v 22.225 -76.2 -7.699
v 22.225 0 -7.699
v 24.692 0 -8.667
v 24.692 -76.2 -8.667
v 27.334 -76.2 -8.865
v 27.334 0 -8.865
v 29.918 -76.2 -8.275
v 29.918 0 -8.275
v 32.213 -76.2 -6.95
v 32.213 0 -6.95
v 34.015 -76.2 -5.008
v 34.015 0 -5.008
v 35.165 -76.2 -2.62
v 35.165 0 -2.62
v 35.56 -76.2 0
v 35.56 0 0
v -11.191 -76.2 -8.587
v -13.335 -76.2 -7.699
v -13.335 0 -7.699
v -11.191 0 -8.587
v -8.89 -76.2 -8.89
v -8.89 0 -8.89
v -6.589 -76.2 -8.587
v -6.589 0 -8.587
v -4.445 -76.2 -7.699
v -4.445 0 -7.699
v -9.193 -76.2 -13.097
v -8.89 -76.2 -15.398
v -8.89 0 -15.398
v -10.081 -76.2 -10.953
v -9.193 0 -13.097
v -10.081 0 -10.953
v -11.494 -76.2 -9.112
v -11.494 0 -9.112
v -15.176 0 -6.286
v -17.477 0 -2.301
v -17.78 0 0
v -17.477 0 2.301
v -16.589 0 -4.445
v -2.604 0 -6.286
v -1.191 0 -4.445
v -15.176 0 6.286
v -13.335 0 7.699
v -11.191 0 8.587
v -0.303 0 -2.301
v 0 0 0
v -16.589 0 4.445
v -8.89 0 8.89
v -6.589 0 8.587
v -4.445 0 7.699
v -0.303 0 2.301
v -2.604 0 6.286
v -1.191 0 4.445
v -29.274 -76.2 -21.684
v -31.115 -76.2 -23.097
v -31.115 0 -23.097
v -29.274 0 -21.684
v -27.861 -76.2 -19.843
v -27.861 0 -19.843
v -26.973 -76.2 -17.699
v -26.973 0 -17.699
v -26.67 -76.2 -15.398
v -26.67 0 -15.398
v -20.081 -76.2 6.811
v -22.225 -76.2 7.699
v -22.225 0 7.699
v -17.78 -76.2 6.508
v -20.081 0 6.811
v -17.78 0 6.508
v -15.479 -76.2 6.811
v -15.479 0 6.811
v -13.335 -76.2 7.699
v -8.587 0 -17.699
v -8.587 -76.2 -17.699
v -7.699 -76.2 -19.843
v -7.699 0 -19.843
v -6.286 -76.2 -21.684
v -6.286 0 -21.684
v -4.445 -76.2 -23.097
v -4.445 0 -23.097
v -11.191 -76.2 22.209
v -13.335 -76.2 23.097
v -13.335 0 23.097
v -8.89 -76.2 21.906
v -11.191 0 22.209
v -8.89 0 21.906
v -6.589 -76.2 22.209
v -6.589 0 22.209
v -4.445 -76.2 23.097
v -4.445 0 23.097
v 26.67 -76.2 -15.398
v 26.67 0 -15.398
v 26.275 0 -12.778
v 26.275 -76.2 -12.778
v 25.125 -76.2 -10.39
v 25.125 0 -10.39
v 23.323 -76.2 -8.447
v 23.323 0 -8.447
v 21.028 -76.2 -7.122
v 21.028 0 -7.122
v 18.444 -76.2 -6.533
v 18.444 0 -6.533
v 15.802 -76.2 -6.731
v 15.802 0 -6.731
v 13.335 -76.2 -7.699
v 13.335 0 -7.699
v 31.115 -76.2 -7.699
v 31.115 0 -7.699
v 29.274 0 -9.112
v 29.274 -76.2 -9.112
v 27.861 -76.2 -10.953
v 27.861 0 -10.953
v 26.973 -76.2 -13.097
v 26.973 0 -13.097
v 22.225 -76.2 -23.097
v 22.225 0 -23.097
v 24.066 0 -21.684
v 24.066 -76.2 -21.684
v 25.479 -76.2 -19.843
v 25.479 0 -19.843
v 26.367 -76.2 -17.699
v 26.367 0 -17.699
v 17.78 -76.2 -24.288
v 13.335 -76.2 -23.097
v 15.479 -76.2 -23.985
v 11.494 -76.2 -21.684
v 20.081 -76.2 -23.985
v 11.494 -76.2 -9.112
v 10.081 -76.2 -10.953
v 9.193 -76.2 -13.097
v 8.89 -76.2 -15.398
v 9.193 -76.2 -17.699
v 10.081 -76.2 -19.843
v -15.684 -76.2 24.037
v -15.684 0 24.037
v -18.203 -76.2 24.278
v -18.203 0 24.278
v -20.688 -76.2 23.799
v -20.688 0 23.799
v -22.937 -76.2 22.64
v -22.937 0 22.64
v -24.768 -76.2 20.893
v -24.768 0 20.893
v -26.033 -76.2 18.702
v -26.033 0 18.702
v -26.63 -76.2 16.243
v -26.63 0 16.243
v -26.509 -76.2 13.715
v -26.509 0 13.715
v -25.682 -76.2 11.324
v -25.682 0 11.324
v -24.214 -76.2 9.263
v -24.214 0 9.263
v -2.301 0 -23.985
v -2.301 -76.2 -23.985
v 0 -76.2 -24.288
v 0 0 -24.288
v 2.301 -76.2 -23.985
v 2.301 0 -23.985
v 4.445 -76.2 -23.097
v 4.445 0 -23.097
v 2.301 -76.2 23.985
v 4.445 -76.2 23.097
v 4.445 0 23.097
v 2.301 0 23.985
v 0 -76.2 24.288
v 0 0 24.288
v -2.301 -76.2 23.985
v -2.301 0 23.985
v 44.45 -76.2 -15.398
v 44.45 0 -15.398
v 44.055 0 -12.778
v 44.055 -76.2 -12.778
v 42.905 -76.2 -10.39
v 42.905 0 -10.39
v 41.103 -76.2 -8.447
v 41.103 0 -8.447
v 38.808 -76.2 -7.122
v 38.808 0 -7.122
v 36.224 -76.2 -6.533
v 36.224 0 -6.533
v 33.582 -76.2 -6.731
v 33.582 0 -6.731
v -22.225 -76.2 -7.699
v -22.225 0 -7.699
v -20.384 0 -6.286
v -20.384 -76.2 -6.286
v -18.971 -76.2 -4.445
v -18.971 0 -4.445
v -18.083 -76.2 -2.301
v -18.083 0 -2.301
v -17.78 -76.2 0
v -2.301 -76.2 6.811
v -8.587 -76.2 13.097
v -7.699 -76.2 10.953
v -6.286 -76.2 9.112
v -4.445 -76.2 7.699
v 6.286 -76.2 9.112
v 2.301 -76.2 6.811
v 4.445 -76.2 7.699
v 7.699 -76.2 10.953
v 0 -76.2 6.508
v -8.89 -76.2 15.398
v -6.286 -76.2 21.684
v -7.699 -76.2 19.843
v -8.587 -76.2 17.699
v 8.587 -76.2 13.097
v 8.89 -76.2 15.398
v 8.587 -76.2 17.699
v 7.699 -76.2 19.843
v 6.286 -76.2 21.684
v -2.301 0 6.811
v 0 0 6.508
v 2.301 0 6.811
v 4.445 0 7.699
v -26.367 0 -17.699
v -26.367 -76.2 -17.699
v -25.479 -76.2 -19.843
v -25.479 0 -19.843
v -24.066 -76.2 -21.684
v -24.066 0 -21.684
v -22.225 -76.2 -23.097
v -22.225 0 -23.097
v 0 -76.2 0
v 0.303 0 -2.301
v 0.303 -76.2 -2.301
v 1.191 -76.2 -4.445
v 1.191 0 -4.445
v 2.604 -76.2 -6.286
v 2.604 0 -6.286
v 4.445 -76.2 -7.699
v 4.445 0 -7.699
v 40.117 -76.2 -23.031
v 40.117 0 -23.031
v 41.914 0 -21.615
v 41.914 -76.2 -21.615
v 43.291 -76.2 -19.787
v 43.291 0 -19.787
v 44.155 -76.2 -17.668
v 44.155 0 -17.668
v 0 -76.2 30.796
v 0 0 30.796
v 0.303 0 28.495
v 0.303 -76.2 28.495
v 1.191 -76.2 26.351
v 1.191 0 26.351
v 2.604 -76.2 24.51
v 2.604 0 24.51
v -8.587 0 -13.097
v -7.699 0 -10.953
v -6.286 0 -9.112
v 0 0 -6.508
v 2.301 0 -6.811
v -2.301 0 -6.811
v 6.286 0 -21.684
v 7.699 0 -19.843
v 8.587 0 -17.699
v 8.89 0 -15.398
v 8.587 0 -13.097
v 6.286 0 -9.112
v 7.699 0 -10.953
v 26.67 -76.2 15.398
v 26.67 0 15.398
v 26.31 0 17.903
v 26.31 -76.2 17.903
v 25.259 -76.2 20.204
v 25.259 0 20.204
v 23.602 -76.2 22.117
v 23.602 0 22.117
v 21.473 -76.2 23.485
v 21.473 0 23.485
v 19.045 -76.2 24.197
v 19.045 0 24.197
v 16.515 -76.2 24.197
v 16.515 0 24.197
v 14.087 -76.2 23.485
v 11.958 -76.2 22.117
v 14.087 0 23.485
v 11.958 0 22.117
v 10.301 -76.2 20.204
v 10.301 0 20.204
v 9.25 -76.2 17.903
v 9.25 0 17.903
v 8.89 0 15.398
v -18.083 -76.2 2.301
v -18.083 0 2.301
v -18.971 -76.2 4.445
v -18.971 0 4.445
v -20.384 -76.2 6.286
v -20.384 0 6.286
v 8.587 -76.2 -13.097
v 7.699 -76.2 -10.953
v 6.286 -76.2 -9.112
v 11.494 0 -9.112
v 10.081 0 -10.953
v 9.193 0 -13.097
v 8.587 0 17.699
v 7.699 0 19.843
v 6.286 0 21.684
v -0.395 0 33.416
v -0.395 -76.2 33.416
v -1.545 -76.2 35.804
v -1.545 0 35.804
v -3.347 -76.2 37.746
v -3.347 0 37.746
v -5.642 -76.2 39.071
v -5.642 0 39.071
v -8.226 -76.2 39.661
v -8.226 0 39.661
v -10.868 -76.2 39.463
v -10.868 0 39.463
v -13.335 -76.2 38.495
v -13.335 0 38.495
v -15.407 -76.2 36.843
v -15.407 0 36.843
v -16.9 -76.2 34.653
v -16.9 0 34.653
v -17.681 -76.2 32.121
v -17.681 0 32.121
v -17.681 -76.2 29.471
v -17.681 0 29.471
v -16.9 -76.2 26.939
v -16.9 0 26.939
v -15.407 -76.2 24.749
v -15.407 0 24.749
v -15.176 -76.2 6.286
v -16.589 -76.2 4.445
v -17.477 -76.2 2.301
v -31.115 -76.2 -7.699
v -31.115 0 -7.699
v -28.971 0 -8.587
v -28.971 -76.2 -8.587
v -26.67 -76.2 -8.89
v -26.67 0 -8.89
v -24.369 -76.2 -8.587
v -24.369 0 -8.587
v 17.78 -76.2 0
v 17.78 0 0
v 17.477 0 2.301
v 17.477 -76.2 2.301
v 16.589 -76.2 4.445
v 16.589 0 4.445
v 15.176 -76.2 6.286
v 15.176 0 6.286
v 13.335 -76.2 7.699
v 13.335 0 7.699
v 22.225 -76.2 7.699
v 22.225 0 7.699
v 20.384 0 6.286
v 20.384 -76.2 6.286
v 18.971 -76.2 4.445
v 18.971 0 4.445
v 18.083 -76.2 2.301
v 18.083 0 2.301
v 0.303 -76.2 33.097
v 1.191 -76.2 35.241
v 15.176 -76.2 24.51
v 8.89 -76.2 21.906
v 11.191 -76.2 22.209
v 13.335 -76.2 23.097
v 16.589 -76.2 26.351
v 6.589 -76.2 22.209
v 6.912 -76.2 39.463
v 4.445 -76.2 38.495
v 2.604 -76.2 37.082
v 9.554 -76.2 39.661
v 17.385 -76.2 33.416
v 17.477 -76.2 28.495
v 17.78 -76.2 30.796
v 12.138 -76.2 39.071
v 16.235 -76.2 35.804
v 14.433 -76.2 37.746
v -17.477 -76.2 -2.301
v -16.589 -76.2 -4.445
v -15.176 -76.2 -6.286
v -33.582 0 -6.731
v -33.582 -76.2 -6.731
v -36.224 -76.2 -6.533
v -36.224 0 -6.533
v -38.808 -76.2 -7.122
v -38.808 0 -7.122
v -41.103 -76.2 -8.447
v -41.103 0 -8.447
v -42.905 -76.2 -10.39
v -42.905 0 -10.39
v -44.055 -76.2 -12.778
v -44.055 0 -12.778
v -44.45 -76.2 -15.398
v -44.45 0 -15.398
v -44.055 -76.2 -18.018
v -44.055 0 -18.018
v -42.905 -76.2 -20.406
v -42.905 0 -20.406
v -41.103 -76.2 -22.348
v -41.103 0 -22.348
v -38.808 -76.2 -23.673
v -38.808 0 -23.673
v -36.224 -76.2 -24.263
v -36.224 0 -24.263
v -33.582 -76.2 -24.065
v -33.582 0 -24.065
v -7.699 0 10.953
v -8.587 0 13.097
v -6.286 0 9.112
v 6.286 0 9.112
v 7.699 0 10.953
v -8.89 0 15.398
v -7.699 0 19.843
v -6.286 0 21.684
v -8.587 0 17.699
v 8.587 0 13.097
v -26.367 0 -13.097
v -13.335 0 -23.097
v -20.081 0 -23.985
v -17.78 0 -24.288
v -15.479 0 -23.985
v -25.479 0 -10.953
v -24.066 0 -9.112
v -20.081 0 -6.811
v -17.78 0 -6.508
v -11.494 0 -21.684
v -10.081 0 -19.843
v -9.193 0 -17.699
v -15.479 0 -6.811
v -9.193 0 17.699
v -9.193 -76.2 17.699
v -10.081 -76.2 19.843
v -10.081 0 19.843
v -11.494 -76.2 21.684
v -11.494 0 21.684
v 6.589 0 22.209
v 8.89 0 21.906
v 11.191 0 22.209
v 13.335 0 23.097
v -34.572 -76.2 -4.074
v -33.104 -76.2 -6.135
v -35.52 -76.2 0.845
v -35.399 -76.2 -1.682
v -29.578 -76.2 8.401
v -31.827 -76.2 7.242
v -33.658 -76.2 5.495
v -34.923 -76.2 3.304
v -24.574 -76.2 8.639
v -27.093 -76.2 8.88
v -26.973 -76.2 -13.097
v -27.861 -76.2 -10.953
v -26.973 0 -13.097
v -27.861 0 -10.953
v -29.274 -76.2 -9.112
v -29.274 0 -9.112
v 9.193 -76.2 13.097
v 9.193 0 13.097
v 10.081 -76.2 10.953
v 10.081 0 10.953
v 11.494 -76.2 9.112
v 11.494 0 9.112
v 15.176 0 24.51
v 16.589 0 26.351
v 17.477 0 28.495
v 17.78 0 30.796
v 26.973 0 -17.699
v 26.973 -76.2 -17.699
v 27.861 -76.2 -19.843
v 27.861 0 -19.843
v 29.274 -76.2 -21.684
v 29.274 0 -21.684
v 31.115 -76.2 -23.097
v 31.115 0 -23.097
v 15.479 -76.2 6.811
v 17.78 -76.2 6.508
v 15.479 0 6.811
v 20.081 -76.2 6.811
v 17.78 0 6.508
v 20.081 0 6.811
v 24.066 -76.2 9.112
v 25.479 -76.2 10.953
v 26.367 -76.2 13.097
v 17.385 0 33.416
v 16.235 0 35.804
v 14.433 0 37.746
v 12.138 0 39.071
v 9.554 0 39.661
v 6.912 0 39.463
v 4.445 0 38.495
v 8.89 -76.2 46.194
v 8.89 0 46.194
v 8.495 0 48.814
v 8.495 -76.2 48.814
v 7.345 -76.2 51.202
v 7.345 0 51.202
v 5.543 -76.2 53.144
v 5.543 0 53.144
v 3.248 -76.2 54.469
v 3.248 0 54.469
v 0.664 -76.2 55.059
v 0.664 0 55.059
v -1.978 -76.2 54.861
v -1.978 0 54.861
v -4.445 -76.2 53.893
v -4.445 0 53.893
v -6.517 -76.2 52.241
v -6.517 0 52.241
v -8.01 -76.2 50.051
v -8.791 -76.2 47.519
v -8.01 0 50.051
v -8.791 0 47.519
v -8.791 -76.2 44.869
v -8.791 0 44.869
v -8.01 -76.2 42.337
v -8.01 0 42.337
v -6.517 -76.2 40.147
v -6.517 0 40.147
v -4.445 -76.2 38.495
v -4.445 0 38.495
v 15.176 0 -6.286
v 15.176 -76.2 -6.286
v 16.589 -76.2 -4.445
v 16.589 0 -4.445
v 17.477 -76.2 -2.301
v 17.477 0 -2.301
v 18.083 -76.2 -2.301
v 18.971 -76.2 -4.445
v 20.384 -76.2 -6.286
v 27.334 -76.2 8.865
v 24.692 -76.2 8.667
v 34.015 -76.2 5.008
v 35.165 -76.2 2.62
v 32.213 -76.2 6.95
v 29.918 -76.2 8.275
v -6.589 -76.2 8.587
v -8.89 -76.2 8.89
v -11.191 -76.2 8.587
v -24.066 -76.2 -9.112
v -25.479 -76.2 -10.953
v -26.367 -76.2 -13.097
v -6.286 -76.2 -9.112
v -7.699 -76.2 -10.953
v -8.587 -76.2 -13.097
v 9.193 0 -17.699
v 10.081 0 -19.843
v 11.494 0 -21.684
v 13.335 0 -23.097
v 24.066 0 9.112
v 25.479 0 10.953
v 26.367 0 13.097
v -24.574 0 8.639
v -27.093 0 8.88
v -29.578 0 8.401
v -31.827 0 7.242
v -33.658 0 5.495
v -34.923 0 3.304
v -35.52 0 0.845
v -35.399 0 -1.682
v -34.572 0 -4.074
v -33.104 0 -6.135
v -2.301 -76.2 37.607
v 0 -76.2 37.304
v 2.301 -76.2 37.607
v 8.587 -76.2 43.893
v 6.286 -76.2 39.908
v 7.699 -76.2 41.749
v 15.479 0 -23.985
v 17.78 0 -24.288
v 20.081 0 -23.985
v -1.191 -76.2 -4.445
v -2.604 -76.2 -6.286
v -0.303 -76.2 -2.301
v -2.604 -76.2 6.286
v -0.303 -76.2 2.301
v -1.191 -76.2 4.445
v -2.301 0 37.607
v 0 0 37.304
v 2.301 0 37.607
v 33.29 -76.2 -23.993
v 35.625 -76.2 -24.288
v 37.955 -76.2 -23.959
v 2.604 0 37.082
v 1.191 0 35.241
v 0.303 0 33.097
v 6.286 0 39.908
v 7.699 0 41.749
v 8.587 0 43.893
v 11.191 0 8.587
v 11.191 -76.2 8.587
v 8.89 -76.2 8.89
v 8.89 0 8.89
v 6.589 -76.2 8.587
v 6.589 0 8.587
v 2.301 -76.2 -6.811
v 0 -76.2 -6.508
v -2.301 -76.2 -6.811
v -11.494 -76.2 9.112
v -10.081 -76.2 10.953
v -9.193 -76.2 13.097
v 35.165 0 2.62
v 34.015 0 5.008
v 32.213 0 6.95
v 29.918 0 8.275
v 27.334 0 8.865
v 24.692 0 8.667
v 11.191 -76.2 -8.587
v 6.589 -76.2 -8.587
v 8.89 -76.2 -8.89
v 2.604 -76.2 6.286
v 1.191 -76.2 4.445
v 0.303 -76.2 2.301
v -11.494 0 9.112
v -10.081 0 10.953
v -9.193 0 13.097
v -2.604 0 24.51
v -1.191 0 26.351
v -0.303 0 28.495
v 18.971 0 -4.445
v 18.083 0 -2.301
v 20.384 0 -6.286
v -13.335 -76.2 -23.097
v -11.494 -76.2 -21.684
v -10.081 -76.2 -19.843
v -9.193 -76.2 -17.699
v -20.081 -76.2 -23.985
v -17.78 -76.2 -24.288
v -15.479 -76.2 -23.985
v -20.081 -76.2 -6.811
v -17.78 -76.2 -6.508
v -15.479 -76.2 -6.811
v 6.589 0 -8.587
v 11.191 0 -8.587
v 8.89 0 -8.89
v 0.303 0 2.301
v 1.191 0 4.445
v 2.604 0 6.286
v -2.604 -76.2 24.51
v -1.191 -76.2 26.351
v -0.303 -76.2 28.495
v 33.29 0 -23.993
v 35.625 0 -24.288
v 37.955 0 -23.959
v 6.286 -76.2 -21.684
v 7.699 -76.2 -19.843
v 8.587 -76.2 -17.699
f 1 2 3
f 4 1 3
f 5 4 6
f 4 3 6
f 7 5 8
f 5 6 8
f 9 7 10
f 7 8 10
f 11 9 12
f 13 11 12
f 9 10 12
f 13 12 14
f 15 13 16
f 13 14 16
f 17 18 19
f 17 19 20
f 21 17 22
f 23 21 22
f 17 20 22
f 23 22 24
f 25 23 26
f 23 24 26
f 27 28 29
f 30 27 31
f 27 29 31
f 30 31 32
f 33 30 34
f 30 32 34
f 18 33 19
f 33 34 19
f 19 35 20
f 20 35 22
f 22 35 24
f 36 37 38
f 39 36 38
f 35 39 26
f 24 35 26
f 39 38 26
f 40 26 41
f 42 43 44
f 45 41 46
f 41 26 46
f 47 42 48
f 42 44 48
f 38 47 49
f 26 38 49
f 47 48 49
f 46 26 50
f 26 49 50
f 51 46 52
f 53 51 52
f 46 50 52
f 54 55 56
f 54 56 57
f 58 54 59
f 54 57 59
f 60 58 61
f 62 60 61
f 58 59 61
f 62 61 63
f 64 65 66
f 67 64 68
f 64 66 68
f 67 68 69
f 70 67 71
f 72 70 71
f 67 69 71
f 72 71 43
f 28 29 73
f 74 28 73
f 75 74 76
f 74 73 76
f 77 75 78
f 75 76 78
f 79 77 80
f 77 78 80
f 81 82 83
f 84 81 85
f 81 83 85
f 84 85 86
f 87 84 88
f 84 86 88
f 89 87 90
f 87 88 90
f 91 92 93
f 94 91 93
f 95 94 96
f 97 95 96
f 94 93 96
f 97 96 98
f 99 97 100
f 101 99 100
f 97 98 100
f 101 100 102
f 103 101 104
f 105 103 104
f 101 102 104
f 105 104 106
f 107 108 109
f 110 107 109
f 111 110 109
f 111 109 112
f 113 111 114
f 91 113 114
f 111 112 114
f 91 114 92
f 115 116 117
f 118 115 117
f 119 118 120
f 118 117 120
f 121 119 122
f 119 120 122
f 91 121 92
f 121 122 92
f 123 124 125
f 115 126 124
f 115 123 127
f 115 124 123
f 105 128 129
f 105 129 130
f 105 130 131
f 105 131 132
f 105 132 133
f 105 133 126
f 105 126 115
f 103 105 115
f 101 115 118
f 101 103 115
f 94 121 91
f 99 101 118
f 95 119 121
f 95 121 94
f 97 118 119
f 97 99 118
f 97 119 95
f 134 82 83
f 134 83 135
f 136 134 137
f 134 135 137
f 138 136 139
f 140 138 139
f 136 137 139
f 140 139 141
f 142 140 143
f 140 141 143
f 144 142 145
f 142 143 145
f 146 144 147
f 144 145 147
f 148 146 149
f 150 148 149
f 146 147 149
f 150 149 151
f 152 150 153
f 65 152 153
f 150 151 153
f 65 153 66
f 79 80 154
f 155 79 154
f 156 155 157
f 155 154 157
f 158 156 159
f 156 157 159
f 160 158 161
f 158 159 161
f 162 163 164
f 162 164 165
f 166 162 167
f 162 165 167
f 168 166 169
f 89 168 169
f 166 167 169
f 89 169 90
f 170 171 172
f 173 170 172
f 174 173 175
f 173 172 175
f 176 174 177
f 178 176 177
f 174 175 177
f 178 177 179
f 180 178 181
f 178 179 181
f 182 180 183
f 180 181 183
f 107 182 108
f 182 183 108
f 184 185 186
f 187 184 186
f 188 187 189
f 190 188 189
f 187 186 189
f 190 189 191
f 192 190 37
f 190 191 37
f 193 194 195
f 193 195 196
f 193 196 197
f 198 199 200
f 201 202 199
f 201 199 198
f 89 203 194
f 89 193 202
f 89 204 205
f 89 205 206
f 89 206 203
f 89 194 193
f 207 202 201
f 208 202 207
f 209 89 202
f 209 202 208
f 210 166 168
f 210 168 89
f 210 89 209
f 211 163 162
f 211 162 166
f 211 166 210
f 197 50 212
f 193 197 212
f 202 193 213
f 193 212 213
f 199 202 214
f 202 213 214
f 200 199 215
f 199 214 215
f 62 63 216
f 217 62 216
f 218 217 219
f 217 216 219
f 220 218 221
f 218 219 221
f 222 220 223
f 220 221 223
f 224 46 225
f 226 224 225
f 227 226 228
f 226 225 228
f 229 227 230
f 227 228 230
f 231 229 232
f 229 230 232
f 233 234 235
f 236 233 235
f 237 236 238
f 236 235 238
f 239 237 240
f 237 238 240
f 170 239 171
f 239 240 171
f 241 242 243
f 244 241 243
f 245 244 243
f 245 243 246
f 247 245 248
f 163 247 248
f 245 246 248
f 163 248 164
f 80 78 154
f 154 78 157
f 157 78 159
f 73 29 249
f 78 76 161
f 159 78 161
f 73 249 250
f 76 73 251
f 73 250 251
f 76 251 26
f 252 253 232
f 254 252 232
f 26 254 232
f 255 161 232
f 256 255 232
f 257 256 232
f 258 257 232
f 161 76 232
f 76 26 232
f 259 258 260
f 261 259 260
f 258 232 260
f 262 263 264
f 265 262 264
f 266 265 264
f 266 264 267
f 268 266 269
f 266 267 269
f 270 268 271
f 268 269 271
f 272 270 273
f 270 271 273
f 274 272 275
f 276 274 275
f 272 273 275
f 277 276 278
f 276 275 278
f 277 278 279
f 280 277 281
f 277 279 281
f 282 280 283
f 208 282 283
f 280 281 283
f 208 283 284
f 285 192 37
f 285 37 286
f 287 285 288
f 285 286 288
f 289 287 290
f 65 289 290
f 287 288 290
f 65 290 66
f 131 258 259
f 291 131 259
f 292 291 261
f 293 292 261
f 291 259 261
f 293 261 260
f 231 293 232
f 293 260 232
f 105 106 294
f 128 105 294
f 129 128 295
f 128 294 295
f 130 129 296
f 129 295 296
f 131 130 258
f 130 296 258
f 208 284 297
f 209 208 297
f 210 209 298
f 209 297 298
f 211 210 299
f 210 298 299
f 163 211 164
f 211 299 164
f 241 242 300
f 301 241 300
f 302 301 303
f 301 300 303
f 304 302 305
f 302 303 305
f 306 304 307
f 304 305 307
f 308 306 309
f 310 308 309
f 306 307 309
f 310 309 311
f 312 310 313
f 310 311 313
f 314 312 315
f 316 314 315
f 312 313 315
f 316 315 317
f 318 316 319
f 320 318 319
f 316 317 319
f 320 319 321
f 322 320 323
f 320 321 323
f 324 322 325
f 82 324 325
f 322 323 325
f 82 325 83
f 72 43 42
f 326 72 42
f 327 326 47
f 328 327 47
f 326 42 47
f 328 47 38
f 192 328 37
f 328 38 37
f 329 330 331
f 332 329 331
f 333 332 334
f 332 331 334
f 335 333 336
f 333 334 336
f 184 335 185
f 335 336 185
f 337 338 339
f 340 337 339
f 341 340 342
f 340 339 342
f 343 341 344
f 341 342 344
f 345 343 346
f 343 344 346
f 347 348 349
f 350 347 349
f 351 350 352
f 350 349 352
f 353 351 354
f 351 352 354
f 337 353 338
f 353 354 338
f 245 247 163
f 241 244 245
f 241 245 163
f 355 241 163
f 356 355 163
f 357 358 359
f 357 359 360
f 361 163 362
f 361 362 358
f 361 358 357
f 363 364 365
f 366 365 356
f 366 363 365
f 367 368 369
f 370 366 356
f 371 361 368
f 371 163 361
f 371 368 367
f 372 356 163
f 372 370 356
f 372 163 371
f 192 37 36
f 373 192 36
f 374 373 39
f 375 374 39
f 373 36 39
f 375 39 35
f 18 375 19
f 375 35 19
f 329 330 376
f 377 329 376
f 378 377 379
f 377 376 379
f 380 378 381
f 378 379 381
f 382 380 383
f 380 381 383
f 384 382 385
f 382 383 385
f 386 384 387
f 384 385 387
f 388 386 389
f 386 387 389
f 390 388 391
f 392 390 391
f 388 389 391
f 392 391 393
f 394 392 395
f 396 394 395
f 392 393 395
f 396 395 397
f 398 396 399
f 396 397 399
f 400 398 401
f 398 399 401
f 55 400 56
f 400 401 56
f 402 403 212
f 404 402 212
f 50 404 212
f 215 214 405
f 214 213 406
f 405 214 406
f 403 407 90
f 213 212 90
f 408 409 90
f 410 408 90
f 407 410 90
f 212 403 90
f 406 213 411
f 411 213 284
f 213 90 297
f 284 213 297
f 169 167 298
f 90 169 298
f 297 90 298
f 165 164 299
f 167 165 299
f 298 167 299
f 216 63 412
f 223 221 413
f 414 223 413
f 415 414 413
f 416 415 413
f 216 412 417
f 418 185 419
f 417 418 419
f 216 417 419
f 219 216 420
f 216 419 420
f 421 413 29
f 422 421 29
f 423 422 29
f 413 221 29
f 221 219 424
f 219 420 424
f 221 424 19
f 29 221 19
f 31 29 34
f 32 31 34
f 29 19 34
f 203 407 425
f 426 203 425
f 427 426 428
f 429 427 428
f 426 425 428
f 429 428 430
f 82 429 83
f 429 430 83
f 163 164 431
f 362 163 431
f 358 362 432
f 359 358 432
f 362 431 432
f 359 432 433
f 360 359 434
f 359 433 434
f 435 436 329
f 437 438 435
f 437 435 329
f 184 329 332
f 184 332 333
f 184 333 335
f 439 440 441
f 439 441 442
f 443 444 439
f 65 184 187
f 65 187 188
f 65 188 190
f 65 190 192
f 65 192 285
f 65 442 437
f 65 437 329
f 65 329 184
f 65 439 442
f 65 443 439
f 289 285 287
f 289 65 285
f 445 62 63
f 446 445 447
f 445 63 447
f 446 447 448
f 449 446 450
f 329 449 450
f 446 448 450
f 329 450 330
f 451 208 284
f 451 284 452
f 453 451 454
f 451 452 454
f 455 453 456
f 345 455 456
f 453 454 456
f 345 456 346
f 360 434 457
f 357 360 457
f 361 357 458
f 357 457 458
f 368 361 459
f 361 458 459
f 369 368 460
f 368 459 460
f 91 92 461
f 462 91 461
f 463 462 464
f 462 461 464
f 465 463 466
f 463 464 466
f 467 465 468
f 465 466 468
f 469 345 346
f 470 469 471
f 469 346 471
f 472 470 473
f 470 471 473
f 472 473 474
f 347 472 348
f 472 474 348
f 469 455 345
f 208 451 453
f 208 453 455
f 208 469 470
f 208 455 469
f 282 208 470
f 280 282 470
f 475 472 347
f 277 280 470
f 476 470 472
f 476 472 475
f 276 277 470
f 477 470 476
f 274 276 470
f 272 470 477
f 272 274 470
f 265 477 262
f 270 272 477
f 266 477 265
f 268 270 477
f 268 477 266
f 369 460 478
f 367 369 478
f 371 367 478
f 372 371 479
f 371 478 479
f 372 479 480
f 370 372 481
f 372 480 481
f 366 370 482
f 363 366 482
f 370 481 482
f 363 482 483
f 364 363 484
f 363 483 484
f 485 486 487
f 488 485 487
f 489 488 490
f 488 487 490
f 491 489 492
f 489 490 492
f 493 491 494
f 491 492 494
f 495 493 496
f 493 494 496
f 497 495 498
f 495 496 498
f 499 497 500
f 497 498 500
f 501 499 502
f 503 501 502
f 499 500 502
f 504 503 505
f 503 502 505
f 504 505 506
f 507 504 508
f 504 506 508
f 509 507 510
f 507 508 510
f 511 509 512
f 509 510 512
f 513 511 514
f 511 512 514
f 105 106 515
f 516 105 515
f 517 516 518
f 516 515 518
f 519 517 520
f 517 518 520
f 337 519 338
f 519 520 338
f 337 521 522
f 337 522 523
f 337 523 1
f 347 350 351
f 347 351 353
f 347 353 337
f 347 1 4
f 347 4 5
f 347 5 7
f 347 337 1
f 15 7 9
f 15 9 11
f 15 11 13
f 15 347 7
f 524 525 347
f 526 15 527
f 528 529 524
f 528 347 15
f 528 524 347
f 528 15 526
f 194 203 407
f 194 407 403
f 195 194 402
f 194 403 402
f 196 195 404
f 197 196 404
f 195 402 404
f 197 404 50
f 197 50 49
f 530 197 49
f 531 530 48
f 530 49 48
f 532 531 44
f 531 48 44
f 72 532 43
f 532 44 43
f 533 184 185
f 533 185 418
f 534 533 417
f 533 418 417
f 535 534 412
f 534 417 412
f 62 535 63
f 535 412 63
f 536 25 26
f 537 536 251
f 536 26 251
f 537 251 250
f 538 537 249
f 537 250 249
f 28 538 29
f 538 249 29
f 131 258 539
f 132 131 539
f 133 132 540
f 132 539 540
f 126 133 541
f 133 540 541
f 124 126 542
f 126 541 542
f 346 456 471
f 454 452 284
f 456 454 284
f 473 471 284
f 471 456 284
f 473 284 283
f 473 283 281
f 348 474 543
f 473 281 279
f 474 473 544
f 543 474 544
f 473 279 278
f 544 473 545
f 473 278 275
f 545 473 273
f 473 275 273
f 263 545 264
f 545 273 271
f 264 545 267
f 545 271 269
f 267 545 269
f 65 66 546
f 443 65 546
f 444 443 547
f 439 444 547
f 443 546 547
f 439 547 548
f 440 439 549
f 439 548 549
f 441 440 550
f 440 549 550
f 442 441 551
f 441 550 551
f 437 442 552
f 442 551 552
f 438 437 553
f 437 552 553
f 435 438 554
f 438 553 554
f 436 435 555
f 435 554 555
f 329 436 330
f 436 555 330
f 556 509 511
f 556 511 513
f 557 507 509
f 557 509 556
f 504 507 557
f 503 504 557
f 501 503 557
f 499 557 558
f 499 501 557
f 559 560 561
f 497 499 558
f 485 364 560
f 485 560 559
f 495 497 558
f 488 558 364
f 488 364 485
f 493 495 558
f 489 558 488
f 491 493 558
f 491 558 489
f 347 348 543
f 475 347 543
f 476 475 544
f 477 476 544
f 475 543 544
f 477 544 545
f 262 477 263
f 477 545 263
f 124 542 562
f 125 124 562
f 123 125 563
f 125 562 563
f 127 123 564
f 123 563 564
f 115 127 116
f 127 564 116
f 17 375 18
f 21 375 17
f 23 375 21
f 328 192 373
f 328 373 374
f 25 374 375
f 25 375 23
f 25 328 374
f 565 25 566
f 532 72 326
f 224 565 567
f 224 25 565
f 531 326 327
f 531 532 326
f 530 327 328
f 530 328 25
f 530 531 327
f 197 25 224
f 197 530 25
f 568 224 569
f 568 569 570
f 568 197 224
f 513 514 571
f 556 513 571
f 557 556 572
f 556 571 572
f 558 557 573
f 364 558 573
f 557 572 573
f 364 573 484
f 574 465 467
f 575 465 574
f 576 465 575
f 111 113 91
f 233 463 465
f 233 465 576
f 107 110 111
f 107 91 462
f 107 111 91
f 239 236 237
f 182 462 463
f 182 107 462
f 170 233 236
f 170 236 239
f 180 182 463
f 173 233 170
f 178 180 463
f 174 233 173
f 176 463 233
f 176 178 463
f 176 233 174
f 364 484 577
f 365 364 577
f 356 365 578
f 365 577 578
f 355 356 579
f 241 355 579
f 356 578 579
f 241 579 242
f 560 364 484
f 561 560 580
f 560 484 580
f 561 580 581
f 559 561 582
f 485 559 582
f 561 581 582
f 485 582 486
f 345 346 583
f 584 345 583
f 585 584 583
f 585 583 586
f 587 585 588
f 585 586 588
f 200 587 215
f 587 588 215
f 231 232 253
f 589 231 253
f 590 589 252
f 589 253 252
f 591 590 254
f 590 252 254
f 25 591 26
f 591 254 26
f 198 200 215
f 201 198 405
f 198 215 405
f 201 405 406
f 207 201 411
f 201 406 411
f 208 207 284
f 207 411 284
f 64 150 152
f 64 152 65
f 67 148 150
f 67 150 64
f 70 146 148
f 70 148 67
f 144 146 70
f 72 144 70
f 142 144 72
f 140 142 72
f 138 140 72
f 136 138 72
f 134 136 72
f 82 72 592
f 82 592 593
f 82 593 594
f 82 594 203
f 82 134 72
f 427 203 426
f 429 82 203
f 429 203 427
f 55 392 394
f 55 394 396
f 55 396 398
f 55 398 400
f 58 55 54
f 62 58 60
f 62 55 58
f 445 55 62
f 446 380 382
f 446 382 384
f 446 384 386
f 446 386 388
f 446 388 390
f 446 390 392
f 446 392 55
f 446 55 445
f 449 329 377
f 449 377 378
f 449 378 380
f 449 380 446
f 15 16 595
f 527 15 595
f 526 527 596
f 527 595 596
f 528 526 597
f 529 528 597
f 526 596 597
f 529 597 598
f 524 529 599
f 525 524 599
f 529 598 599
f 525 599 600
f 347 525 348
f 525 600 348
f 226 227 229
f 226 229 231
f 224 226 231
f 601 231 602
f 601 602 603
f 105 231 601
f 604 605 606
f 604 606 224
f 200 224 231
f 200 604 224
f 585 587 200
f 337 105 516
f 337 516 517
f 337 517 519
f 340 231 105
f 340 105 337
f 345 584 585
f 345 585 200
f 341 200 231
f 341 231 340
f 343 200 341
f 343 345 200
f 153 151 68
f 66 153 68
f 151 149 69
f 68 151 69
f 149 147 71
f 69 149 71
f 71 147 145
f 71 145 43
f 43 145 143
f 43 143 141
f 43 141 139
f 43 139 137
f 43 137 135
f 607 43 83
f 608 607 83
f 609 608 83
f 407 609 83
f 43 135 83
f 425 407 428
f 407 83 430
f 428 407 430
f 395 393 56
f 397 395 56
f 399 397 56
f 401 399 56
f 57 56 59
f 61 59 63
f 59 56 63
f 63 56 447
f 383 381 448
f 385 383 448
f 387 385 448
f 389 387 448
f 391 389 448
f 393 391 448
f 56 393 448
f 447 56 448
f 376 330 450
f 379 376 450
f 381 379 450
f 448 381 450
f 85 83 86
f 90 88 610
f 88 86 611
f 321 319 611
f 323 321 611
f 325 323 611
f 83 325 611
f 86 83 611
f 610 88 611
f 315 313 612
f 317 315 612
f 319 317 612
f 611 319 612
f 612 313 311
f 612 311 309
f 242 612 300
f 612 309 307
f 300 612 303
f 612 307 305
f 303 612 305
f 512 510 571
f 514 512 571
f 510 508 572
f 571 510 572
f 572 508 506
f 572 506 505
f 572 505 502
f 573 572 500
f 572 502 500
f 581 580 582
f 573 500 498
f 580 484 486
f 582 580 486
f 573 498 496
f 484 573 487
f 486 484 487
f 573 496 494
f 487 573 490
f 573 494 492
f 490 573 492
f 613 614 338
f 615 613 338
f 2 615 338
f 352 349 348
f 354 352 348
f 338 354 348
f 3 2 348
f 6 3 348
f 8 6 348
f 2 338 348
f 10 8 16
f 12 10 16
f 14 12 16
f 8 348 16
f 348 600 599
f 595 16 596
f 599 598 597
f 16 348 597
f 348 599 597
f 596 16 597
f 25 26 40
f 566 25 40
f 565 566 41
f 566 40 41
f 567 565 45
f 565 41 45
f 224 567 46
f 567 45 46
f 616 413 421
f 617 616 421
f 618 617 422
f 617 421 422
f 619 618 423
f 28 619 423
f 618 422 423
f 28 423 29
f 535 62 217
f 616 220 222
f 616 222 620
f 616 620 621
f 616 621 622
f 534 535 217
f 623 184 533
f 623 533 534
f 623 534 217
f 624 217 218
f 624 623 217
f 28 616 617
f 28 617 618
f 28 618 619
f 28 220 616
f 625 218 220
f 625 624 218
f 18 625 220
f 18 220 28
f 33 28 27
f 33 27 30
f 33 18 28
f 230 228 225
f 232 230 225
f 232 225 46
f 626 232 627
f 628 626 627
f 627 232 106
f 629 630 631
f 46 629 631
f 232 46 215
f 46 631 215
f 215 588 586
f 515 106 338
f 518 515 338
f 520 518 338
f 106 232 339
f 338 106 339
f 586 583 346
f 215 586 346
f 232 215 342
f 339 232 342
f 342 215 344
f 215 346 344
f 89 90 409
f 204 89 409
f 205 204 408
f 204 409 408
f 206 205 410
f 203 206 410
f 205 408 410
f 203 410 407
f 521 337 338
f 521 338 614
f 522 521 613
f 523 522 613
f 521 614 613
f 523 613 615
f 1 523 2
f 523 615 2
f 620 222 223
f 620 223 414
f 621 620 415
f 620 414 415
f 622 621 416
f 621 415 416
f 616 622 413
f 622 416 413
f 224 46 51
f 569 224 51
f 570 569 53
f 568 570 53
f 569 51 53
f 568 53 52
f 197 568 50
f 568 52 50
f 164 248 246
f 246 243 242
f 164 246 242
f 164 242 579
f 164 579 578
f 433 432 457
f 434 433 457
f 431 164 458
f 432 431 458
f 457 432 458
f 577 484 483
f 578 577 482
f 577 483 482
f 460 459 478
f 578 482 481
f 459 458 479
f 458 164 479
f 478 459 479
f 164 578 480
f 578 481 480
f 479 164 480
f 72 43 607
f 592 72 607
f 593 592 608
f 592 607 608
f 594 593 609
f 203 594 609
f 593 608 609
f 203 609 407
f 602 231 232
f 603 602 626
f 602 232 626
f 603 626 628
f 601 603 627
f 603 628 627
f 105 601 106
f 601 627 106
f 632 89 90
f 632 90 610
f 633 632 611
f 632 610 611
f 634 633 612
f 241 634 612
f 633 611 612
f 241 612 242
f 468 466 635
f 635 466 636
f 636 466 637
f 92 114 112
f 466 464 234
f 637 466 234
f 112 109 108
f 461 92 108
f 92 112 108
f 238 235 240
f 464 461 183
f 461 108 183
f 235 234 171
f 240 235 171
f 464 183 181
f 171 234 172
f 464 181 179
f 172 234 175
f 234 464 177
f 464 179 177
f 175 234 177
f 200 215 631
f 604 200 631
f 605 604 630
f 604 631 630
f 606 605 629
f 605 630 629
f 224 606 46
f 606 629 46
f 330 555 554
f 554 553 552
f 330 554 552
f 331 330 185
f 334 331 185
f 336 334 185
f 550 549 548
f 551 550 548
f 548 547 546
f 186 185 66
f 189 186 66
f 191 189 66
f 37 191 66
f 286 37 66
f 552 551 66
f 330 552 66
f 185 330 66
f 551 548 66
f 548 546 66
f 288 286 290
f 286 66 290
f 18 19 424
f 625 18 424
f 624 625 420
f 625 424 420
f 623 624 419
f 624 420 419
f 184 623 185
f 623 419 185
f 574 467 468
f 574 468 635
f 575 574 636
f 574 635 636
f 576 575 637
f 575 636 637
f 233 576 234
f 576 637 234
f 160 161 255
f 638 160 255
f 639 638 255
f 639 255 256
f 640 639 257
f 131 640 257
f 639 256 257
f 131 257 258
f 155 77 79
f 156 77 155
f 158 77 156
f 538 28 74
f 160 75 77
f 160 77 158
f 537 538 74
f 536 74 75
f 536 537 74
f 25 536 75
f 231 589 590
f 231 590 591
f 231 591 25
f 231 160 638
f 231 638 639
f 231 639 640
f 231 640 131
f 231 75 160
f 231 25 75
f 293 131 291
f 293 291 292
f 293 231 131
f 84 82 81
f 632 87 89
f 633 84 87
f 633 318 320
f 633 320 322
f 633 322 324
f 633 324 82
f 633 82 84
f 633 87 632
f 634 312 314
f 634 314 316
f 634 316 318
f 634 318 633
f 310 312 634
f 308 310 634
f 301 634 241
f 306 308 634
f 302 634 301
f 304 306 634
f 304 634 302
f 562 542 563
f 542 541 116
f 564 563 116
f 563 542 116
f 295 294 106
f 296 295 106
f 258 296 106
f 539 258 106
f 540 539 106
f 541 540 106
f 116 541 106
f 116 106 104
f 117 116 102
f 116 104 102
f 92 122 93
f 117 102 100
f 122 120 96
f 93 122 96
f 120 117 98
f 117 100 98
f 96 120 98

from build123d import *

# Parameters (mm, degrees)
F1_DEPTH = 76.2


# Not quite as in the source:
# - a feature names something its author has since deleted; it is built from what else it names


with BuildPart() as f1:
    # F0 (on Front) → F1 (new body)
    with BuildSketch(Plane.XZ):
        with BuildLine():
            ThreePointArc((-13.3350000199, 23.0968975304), (-25.4789658129, 19.8429317256), (-22.2250001126, 7.6989659046))
            ThreePointArc((-22.2250001126, 7.6989659046), (-17.780000037, 6.5079316793), (-13.3349999515, 7.6989658677))
            ThreePointArc((-13.3349999515, 7.6989658677), (-10.0810341464, 10.9529317035), (-8.89, 15.3979316793))
            ThreePointArc((-8.89, 15.3979316793), (-10.0810341661, 19.8429316893), (-13.3350000199, 23.0968975304))
        make_face()
    extrude(amount=F1_DEPTH)


with BuildPart() as f1b:
    # F0 (on Front) → F1, piece 2 (new body)
    with BuildSketch(Plane.XZ):
        with BuildLine():
            ThreePointArc((-8.89, 15.3979316793), (-7.6989658311, 10.9529316645), (-4.4449999705, 7.6989658226))
            ThreePointArc((-4.4449999705, 7.6989658226), (6.75e-08, 6.5079316793), (4.4450000875, 7.6989658901))
            ThreePointArc((4.4450000875, 7.6989658901), (7.6989658649, 10.952931723), (8.89, 15.3979316793))
            ThreePointArc((8.89, 15.3979316793), (7.6989657927, 19.8429317606), (4.4449998375, 23.0968976128))
            ThreePointArc((4.4449998375, 23.0968976128), (-4.81e-08, 24.2879316793), (-4.4449999207, 23.0968975647))
            ThreePointArc((-4.4449999207, 23.0968975647), (-7.6989658168, 19.8429317189), (-8.89, 15.3979316793))
        make_face()
    extrude(amount=F1_DEPTH)


with BuildPart() as f1c:
    # F0 (on Front) → F1, piece 3 (new body)
    with BuildSketch(Plane.XZ):
        with BuildLine():
            ThreePointArc((8.89, 15.3979316793), (10.0810341244, 10.9529317415), (13.3349998755, 7.6989659115))
            ThreePointArc((13.3349998755, 7.6989659115), (17.7799998064, 6.5079316793), (22.2249997892, 7.6989657179))
            ThreePointArc((22.2249997892, 7.6989657179), (25.4789657788, 10.9529315739), (26.67, 15.3979316793))
            ThreePointArc((26.67, 15.3979316793), (22.2250001076, 23.0968974568), (13.3350002151, 23.0968976431))
            ThreePointArc((13.3350002151, 23.0968976431), (10.0810342225, 19.8429317869), (8.89, 15.3979316793))
        make_face()
    extrude(amount=F1_DEPTH)


with BuildPart() as f1d:
    # F0 (on Front) → F1, piece 4 (new body)
    with BuildSketch(Plane.XZ):
        with BuildLine():
            ThreePointArc((22.2249997892, 7.6989657179), (18.9710340995, 4.4449998946), (17.78, 0))
            ThreePointArc((17.78, 0), (18.9710341607, -4.4450000007), (22.2250000013, -7.6989658404))
            ThreePointArc((22.2250000013, -7.6989658404), (26.6699999179, -8.89), (31.1149998565, -7.6989659225))
            ThreePointArc((31.1149998565, -7.6989659225), (34.3689657982, -4.4450000718), (35.56, 0))
            ThreePointArc((35.56, 0), (31.1149998946, 7.6989659005), (22.2249997892, 7.6989657179))
        make_face()
    extrude(amount=F1_DEPTH)


with BuildPart() as f1e:
    # F0 (on Front) → F1, piece 5 (new body)
    with BuildSketch(Plane.XZ):
        with BuildLine():
            ThreePointArc((4.4450000875, 7.6989658901), (1.1910341856, 4.4450000437), (0, 0))
            ThreePointArc((0, 0), (1.191034094, -4.4449998851), (4.4449997703, -7.698965707))
            ThreePointArc((4.4449997703, -7.698965707), (8.8899998666, -8.89), (13.3349999987, -7.6989658404))
            ThreePointArc((13.3349999987, -7.6989658404), (16.5889658393, -4.4450000007), (17.78, 0))
            ThreePointArc((17.78, 0), (16.5889658037, 4.4450000622), (13.3349998755, 7.6989659115))
            ThreePointArc((13.3349998755, 7.6989659115), (8.8899999786, 8.89), (4.4450000875, 7.6989658901))
        make_face()
    extrude(amount=F1_DEPTH)


with BuildPart() as f1f:
    # F0 (on Front) → F1, piece 6 (new body)
    with BuildSketch(Plane.XZ):
        with BuildLine():
            ThreePointArc((-13.3349999515, 7.6989658677), (-16.5889658256, 4.4450000243), (-17.78, 0))
            ThreePointArc((-17.78, 0), (-16.5889664254, -4.4449989854), (-13.3350020292, -7.6989646681))
            ThreePointArc((-13.3350020292, -7.6989646681), (-8.8900010389, -8.89), (-4.4449997703, -7.698965707))
            ThreePointArc((-4.4449997703, -7.698965707), (-1.191034094, -4.4449998851), (0, 0))
            ThreePointArc((0, 0), (-1.1910341518, 4.4449999853), (-4.4449999705, 7.6989658226))
            ThreePointArc((-4.4449999705, 7.6989658226), (-8.889999955, 8.89), (-13.3349999515, 7.6989658677))
        make_face()
    extrude(amount=F1_DEPTH)


with BuildPart() as f1g:
    # F0 (on Front) → F1, piece 7 (new body)
    with BuildSketch(Plane.XZ):
        with BuildLine():
            ThreePointArc((-22.2249979726, -7.6989646691), (-18.9710335751, -4.4449989863), (-17.78, 0))
            ThreePointArc((-17.78, 0), (-18.9710341928, 4.4450000563), (-22.2250001126, 7.6989659046))
            ThreePointArc((-22.2250001126, 7.6989659046), (-34.3689658547, 4.4449999739), (-31.1150000603, -7.6989658048))
            ThreePointArc((-31.1150000603, -7.6989658048), (-26.6699988643, -8.89), (-22.2249979726, -7.6989646691))
        make_face()
    extrude(amount=F1_DEPTH)


with BuildPart() as f1h:
    # F0 (on Front) → F1, piece 8 (new body)
    with BuildSketch(Plane.XZ):
        with BuildLine():
            ThreePointArc((-26.67, -15.3979316793), (-27.8610341778, -10.9529316492), (-31.1150000603, -7.6989658048))
            ThreePointArc((-31.1150000603, -7.6989658048), (-43.2589658414, -10.9529316824), (-40.0050000541, -23.0968974877))
            ThreePointArc((-40.0050000541, -23.0968974877), (-35.559998118, -24.2879316793), (-31.1149966862, -23.0968956057))
            ThreePointArc((-31.1149966862, -23.0968956057), (-27.8610332037, -19.8429300224), (-26.67, -15.3979316793))
        make_face()
    extrude(amount=F1_DEPTH)


with BuildPart() as f1i:
    # F0 (on Front) → F1, piece 9 (new body)
    with BuildSketch(Plane.XZ):
        with BuildLine():
            ThreePointArc((-13.3350020292, -7.6989646681), (-17.780000001, -6.5079316793), (-22.2249979726, -7.6989646691))
            ThreePointArc((-22.2249979726, -7.6989646691), (-25.4789652544, -10.9529306656), (-26.67, -15.3979316793))
            ThreePointArc((-26.67, -15.3979316793), (-25.4789658625, -19.8429316396), (-22.2250000793, -23.0968974731))
            ThreePointArc((-22.2250000793, -23.0968974731), (-17.7799999131, -24.2879316793), (-13.3349997703, -23.0968973863))
            ThreePointArc((-13.3349997703, -23.0968973863), (-10.081034094, -19.8429315644), (-8.89, -15.3979316793))
            ThreePointArc((-8.89, -15.3979316793), (-10.0810347461, -10.9529306647), (-13.3350020292, -7.6989646681))
        make_face()
    extrude(amount=F1_DEPTH)


with BuildPart() as f1j:
    # F0 (on Front) → F1, piece 10 (new body)
    with BuildSketch(Plane.XZ):
        with BuildLine():
            ThreePointArc((4.4450002297, -7.6989649112), (0, -6.5079306182), (-4.4450002297, -7.6989649112))
            ThreePointArc((-4.4450002297, -7.6989649112), (-7.6989661712, -10.9529311925), (-8.89, -15.3979316793))
            ThreePointArc((-8.89, -15.3979316793), (-7.6989648637, -19.8429323085), (-4.4449975383, -23.0968978791))
            ThreePointArc((-4.4449975383, -23.0968978791), (-6.17e-07, -24.2879306182), (4.4449964696, -23.0968984961))
            ThreePointArc((4.4449964696, -23.0968984961), (7.6989648205, -19.8429323834), (8.89, -15.3979306182))
            ThreePointArc((8.89, -15.3979306182), (7.698965906, -10.9529307331), (4.4450002297, -7.6989649112))
        make_face()
    extrude(amount=F1_DEPTH)


with BuildPart() as f1k:
    # F0 (on Front) → F1, piece 11 (new body)
    with BuildSketch(Plane.XZ):
        with BuildLine():
            ThreePointArc((22.2250000013, -7.6989658404), (17.78, -6.5079316793), (13.3349999987, -7.6989658404))
            ThreePointArc((13.3349999987, -7.6989658404), (10.0810344252, -10.9529312205), (8.89, -15.3979306182))
            ThreePointArc((8.89, -15.3979306182), (10.0810338288, -19.842931105), (13.3349997703, -23.0968973863))
            ThreePointArc((13.3349997703, -23.0968973863), (17.7799999128, -24.2879316793), (22.2250000786, -23.0968974735))
            ThreePointArc((22.2250000786, -23.0968974735), (25.4789658623, -19.84293164), (26.67, -15.3979316793))
            ThreePointArc((26.67, -15.3979316793), (25.47896584, -10.9529316799), (22.2250000013, -7.6989658404))
        make_face()
    extrude(amount=F1_DEPTH)


with BuildPart() as f1l:
    # F0 (on Front) → F1, piece 12 (new body)
    with BuildSketch(Plane.XZ):
        with BuildLine():
            ThreePointArc((44.45, -15.3979316793), (40.0049999282, -7.6989657982), (31.1149998565, -7.6989659225))
            ThreePointArc((31.1149998565, -7.6989659225), (27.8610341189, -10.952931751), (26.67, -15.3979316793))
            ThreePointArc((26.67, -15.3979316793), (27.861034132, -19.8429316301), (31.1149999017, -23.0968974622))
            ThreePointArc((31.1149999017, -23.0968974622), (35.6247538204, -24.2876958462), (40.1166823692, -23.031328419))
            ThreePointArc((40.1166823692, -23.031328419), (43.2911385404, -19.7867352599), (44.45, -15.3979316793))
        make_face()
    extrude(amount=F1_DEPTH)


with BuildPart() as f1m:
    # F0 (on Front) → F1, piece 13 (new body)
    with BuildSketch(Plane.XZ):
        with BuildLine():
            ThreePointArc((-4.4450000175, 38.4948292083), (-16.5889658389, 35.2408633598), (-13.3350000199, 23.0968975304))
            ThreePointArc((-13.3350000199, 23.0968975304), (-8.8899999657, 21.9058633586), (-4.4449999207, 23.0968975647))
            ThreePointArc((-4.4449999207, 23.0968975647), (-1.1910341375, 26.3508633982), (0, 30.7958633586))
            ThreePointArc((0, 30.7958633586), (-1.1910341654, 35.2408633673), (-4.4450000175, 38.4948292083))
        make_face()
    extrude(amount=F1_DEPTH)


with BuildPart() as f1n:
    # F0 (on Front) → F1, piece 14 (new body)
    with BuildSketch(Plane.XZ):
        with BuildLine():
            ThreePointArc((4.4449999987, 38.4948291975), (1.19103416, 35.2408633579), (0, 30.7958633586))
            ThreePointArc((0, 30.7958633586), (1.1910341134, 26.3508634398), (4.4449998375, 23.0968976128))
            ThreePointArc((4.4449998375, 23.0968976128), (8.8900000304, 21.9058633586), (13.3350002151, 23.0968976431))
            ThreePointArc((13.3350002151, 23.0968976431), (16.5889659017, 26.3508634661), (17.78, 30.7958633586))
            ThreePointArc((17.78, 30.7958633586), (13.3349999993, 38.4948291986), (4.4449999987, 38.4948291975))
        make_face()
    extrude(amount=F1_DEPTH)


with BuildPart() as f1o:
    # F0 (on Front) → F1, piece 15 (new body)
    with BuildSketch(Plane.XZ):
        with BuildLine():
            ThreePointArc((8.89, 46.1937950379), (-4.4449999913, 53.8927608825), (-4.4450000175, 38.4948292083))
            ThreePointArc((-4.4450000175, 38.4948292083), (-1.08e-08, 37.3037950379), (4.4449999987, 38.4948291975))
            ThreePointArc((4.4449999987, 38.4948291975), (7.6989658393, 41.7487950372), (8.89, 46.1937950379))
        make_face()
    extrude(amount=F1_DEPTH)


solid = Compound([f1.part, f1b.part, f1c.part, f1d.part, f1e.part, f1f.part, f1g.part, f1h.part, f1i.part, f1j.part, f1k.part, f1l.part, f1m.part, f1n.part, f1o.part])
